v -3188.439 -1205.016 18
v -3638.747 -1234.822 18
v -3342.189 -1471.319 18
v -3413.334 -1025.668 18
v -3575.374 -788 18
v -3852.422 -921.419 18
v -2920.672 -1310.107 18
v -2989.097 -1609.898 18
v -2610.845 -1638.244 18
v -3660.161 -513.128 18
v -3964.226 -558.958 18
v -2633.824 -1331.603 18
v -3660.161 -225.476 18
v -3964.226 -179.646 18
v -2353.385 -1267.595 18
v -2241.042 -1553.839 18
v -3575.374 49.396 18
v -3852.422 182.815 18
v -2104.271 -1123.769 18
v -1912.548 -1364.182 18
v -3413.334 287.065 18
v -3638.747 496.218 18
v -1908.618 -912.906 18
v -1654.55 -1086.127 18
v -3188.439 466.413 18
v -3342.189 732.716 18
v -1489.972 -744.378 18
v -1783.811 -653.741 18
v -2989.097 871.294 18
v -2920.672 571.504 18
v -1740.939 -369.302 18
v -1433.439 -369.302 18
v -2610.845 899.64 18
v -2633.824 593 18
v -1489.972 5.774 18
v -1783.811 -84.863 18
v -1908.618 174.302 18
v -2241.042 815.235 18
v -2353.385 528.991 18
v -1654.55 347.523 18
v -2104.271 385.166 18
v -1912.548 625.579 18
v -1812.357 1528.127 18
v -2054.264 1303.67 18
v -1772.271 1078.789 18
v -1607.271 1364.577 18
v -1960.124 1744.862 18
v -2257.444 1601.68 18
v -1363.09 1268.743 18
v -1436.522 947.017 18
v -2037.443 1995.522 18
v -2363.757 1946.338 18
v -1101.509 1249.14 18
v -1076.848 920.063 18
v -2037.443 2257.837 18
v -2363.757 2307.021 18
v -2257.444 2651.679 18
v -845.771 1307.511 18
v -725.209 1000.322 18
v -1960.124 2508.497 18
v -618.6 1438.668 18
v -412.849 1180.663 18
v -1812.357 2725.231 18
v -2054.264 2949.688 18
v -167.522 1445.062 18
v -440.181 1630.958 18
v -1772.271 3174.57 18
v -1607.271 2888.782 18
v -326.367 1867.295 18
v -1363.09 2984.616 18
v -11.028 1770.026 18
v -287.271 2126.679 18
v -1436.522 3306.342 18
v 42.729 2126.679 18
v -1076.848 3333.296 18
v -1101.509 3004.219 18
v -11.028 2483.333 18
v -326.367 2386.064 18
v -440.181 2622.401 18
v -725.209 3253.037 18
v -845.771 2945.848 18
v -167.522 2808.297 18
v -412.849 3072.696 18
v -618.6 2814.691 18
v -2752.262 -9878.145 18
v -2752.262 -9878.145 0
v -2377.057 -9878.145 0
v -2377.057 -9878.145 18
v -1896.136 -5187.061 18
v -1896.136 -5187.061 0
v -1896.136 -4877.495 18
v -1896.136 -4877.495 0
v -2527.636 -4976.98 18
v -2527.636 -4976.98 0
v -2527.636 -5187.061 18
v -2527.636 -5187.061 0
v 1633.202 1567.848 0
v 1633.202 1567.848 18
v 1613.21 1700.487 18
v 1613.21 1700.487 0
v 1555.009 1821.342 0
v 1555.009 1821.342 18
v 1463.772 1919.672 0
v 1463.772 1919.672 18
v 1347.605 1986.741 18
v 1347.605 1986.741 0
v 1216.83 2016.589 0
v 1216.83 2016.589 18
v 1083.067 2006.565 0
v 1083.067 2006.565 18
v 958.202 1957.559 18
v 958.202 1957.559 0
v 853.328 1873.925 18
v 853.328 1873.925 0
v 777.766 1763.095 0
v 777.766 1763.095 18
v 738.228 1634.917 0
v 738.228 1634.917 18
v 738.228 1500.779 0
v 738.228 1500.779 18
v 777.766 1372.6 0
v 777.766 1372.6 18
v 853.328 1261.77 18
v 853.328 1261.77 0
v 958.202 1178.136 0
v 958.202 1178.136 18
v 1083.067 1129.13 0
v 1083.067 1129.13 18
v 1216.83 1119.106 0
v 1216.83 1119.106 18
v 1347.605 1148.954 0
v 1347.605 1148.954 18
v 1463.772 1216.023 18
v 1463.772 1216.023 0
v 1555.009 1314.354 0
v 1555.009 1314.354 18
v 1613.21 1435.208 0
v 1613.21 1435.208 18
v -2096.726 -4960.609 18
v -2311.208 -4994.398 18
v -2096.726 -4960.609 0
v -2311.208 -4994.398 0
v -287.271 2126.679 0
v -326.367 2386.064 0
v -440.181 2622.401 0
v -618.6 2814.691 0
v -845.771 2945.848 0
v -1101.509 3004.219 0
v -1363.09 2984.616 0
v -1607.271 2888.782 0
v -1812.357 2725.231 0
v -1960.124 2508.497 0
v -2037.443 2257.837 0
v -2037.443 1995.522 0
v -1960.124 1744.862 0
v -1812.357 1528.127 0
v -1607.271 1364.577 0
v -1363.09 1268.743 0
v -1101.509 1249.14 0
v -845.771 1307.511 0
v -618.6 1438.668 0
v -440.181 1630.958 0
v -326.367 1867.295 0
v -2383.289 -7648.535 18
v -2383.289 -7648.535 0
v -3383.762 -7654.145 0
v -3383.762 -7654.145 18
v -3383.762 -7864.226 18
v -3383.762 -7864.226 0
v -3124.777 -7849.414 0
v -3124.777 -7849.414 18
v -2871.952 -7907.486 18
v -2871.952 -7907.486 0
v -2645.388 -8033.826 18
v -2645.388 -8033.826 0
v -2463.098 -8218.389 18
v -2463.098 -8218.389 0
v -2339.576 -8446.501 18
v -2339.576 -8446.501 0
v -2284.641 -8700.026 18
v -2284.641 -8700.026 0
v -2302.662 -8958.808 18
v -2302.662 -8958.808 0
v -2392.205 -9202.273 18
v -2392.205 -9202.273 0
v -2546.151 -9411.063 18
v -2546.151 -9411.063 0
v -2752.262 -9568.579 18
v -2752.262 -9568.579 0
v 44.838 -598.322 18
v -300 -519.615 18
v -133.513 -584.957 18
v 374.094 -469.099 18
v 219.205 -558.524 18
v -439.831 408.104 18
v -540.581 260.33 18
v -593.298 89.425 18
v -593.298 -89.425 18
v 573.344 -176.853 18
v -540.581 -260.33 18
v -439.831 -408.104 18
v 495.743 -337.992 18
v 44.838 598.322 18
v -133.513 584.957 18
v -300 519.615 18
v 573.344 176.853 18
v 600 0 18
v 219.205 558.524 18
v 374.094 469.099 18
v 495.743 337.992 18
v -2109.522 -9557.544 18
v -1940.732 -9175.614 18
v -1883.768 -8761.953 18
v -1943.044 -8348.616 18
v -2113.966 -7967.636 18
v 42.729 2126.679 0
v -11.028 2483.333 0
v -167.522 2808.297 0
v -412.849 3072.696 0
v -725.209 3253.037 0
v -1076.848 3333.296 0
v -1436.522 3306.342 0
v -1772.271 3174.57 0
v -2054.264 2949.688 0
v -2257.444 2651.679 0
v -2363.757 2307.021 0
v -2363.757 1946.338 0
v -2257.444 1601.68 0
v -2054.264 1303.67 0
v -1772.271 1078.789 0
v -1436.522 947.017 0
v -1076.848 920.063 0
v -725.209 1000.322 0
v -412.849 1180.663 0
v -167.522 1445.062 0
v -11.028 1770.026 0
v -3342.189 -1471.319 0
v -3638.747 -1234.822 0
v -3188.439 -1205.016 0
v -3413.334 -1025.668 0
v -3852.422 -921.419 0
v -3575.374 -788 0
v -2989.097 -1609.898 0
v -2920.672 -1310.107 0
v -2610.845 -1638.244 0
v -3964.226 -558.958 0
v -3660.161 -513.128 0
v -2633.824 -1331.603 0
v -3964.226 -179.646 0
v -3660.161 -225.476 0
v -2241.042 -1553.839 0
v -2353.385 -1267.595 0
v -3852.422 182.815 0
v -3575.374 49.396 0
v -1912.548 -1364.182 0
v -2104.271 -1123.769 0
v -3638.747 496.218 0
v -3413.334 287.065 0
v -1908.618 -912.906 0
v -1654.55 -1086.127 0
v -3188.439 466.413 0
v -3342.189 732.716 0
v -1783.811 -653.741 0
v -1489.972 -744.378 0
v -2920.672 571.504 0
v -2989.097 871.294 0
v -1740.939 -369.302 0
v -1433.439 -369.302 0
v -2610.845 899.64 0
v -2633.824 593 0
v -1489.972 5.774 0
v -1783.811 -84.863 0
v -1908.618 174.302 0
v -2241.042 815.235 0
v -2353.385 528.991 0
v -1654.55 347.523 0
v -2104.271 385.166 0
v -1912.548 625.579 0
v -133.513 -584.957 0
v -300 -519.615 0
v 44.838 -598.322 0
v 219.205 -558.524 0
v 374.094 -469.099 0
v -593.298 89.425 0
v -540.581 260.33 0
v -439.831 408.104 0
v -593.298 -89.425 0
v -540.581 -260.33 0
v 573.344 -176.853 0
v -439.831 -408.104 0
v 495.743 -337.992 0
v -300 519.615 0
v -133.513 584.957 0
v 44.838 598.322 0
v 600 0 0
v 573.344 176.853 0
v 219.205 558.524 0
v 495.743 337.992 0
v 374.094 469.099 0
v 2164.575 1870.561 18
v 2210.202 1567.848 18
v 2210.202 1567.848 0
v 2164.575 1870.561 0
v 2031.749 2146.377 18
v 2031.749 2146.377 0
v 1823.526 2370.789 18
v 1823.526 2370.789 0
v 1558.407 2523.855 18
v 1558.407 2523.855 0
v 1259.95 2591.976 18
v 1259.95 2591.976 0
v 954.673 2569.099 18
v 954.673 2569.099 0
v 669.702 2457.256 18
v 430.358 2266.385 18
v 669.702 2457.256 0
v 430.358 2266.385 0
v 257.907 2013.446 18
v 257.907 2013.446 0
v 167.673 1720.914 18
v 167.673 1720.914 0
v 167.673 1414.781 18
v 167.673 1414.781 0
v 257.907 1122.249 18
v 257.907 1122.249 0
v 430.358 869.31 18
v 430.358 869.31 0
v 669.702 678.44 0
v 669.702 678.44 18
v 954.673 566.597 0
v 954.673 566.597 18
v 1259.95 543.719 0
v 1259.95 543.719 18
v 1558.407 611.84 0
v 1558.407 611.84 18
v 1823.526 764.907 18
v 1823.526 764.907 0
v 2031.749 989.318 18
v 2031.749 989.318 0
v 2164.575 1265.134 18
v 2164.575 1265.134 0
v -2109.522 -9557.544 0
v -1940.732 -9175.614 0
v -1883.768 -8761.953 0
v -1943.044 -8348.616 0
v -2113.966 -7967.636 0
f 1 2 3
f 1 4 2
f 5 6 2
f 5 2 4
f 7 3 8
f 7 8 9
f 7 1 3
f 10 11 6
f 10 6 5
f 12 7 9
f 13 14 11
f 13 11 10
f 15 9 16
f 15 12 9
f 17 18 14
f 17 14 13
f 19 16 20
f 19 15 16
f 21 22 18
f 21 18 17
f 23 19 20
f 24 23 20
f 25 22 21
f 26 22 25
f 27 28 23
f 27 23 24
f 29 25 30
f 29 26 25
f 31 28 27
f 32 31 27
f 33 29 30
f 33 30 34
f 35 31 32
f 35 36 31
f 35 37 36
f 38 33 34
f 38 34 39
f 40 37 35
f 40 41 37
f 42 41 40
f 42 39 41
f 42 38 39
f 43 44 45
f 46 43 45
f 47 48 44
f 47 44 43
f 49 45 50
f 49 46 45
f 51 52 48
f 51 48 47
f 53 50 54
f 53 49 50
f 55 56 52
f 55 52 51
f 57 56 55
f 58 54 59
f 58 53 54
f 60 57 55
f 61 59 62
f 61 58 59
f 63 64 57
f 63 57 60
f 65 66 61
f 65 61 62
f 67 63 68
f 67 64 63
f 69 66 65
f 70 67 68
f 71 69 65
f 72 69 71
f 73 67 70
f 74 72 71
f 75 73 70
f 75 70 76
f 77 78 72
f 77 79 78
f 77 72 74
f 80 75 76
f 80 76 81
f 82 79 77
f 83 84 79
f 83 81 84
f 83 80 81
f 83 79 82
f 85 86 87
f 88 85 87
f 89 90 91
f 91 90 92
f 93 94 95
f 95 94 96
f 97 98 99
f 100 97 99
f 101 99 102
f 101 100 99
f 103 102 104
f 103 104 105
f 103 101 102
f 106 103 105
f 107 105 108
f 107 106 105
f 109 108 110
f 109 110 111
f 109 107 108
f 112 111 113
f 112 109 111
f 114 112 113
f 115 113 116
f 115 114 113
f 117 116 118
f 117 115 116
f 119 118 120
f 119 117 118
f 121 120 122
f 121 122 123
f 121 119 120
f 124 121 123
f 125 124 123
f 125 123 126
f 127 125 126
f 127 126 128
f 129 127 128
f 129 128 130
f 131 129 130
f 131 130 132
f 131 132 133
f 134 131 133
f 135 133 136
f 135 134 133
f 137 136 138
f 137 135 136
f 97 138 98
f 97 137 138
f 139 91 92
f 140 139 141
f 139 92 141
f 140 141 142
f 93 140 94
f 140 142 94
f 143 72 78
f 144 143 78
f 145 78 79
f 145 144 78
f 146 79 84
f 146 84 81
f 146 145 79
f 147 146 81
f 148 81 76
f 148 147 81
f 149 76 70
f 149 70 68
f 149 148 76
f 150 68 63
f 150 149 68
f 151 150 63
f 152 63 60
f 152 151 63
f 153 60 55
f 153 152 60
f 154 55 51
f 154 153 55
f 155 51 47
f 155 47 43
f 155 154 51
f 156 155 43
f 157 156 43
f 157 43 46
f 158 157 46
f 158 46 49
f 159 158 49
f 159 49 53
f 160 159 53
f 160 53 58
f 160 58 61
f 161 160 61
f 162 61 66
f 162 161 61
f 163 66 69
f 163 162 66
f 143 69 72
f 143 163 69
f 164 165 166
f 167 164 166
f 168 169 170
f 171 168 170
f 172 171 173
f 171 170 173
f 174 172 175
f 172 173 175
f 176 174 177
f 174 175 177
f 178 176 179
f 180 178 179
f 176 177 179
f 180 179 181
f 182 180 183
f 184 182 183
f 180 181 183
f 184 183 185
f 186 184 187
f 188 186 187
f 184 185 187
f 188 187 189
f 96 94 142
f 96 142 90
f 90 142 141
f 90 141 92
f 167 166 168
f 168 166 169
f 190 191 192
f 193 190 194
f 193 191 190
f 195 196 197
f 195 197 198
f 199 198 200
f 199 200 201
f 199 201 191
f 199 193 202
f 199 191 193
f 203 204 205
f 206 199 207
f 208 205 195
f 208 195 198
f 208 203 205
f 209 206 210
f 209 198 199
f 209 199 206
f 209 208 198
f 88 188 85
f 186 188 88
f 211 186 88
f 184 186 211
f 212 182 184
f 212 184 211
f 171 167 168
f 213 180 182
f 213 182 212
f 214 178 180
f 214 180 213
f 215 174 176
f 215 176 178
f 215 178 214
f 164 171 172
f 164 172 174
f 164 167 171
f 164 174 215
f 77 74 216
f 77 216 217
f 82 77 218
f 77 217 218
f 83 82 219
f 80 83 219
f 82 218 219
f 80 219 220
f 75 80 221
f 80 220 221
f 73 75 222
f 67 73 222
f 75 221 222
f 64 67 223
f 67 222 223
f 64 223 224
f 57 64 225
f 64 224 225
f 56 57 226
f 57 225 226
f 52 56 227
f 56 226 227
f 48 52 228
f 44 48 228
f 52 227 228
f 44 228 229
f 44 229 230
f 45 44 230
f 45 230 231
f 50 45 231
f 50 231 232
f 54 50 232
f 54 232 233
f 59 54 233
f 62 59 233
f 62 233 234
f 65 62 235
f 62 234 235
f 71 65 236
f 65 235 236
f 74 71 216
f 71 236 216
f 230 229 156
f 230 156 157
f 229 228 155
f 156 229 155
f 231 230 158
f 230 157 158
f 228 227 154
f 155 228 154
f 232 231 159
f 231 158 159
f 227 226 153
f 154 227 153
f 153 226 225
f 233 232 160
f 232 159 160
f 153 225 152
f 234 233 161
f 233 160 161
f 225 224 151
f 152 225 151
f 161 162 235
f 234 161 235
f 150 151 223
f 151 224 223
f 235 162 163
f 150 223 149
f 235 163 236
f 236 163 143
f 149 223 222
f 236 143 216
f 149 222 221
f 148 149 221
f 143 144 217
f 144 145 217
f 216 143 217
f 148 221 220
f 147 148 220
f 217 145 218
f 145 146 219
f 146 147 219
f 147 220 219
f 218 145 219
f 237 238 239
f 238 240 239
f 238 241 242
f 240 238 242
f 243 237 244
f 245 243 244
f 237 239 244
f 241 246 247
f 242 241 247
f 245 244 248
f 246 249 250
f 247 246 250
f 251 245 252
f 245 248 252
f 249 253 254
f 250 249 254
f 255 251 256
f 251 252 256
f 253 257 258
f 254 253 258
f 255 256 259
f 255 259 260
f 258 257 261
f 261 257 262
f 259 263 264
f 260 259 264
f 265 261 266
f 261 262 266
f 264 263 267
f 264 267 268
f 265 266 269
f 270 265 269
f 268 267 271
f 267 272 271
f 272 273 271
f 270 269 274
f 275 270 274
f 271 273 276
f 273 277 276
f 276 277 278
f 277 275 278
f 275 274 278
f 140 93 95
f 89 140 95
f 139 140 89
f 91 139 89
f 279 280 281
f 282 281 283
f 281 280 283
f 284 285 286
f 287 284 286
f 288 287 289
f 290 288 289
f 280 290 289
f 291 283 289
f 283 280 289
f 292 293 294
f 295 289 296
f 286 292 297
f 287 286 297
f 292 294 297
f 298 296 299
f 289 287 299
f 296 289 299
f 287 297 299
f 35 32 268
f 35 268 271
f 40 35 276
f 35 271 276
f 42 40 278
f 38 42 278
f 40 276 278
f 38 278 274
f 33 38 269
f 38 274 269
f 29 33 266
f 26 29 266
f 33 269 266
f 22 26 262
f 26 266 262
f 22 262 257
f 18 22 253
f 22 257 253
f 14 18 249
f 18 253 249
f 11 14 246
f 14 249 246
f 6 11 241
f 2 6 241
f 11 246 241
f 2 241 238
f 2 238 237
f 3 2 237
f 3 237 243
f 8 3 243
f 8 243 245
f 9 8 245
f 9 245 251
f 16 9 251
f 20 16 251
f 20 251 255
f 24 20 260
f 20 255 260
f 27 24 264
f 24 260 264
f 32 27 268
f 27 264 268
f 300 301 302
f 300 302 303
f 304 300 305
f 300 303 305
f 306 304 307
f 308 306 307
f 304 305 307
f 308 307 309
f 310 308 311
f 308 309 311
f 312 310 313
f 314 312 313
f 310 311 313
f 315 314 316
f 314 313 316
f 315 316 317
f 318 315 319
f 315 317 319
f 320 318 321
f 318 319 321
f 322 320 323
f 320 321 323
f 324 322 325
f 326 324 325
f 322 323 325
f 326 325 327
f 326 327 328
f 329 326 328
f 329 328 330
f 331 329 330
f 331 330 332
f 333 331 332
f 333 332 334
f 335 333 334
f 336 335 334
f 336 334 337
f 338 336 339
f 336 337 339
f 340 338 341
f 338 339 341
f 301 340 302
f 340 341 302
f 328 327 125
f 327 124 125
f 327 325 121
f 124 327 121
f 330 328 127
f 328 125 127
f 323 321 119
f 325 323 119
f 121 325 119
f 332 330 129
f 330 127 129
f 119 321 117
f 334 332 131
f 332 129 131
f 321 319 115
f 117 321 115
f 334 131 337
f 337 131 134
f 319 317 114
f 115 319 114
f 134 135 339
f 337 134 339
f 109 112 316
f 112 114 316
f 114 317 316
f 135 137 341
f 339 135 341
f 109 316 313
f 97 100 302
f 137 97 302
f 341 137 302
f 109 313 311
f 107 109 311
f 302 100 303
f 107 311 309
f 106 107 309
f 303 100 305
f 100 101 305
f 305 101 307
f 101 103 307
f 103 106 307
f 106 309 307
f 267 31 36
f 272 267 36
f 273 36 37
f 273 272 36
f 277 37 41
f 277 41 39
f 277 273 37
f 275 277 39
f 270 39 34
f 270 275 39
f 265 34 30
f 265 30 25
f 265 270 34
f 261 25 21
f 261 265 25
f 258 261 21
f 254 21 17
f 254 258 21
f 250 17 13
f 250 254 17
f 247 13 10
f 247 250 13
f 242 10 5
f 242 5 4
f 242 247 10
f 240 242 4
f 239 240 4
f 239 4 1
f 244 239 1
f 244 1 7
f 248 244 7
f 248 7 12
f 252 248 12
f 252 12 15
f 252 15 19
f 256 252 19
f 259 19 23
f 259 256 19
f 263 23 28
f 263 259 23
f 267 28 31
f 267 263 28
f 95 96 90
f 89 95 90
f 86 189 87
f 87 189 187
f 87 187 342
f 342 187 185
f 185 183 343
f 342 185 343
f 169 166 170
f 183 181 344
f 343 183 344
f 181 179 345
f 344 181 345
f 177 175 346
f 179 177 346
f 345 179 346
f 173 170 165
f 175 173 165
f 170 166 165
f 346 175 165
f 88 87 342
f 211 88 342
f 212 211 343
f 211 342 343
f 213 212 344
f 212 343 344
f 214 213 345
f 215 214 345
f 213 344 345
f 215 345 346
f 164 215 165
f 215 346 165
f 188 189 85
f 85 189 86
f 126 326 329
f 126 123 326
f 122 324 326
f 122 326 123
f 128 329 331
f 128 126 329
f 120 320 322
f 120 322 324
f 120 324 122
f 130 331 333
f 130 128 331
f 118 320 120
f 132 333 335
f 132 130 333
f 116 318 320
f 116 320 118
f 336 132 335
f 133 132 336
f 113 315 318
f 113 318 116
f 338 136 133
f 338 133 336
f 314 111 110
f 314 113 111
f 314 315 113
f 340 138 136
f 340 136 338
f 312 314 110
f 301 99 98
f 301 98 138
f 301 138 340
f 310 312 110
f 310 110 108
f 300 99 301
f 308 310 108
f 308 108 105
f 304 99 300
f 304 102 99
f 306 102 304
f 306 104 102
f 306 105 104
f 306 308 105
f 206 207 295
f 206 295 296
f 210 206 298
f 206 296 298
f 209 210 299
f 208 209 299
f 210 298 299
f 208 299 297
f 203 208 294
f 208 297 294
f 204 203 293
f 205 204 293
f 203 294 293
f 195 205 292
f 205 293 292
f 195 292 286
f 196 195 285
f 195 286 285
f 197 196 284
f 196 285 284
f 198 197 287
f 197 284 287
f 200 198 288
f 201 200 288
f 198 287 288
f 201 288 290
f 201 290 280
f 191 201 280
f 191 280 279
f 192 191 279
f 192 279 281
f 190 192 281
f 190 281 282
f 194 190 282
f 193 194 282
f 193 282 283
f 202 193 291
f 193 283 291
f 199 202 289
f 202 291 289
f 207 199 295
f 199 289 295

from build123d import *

# Parameters (mm, degrees)
F0_R      = 600
F1_DEPTH  = 18
F2_R      = 1027
F2_R_2    = 450
F3_DEPTH  = 18
F4_R      = 1210
F4_R_2    = 880
F5_DEPTH  = 18
F6_R      = 1272.5
F6_R_2    = 965
F7_DEPTH  = 18
F9_DEPTH  = 18
F11_DEPTH = 18


with BuildPart() as f1:
    # F0 (on Top) → F1 (new body)
    with BuildSketch(Plane.XY):
        Circle(F0_R)
    extrude(amount=F1_DEPTH)


with BuildPart() as f3:
    # F2 (on Top) → F3 (new body)
    with BuildSketch(Plane.XY):
        with Locations((1183.201789856, 1567.84760952)):
            Circle(F2_R)
        with Locations((1183.201789856, 1567.84760952)):
            Circle(F2_R_2, mode=Mode.SUBTRACT)
    extrude(amount=F3_DEPTH)


with BuildPart() as f5:
    # F4 (on Top) → F5 (new body)
    with BuildSketch(Plane.XY):
        with Locations((-1167.2713756561, 2126.6794204712)):
            Circle(F4_R)
        with Locations((-1167.2713756561, 2126.6794204712)):
            Circle(F4_R_2, mode=Mode.SUBTRACT)
    extrude(amount=F5_DEPTH)


with BuildPart() as f7:
    # F6 (on Top) → F7 (new body)
    with BuildSketch(Plane.XY):
        with Locations((-2705.9388160706, -369.3017959595)):
            Circle(F6_R)
        with Locations((-2705.9388160706, -369.3017959595)):
            Circle(F6_R_2, mode=Mode.SUBTRACT)
    extrude(amount=F7_DEPTH)


with BuildPart() as f9:
    # F8 (on Top) → F9 (new body)
    with BuildSketch(Plane.XY):
        with BuildLine():
            ThreePointArc((-1896.1358144379, -4877.4950429265), (-2202.9667353597, -4983.8530885251), (-2527.6358144379, -4976.9801715458))
            Line((-2527.6358144379, -4976.9801715458), (-2527.6358144379, -5187.0612450341))
            Line((-2527.6358144379, -5187.0612450341), (-1896.1358144379, -5187.0612450341))
            Line((-1896.1358144379, -5187.0612450341), (-1896.1358144379, -4877.4950429265))
        make_face()
    extrude(amount=F9_DEPTH)


with BuildPart() as f11:
    # F10 (on face) → F11 (new body)
    with BuildSketch(Plane.XY):
        with BuildLine():
            ThreePointArc((-3383.762090595, -7864.2263730014), (-2339.5758122783, -8446.5011454854), (-2752.262090595, -9568.5790974055))
            Line((-2752.262090595, -9568.5790974055), (-2752.262090595, -9878.1452995131))
            Line((-2752.262090595, -9878.1452995131), (-2498.4145172777, -9878.1452995131))
            Line((-2498.4145172777, -9878.1452995131), (-2377.0565725809, -9878.1452995131))
            ThreePointArc((-2377.0565725809, -9878.1452995131), (-1883.7679503047, -8761.952556401), (-2383.2887193923, -7648.5348872878))
            Line((-2383.2887193923, -7648.5348872878), (-3383.762090595, -7654.1452995131))
            Line((-3383.762090595, -7654.1452995131), (-3383.762090595, -7864.2263730014))
        make_face()
    extrude(amount=F11_DEPTH)


solid = Compound([f1.part, f3.part, f5.part, f7.part, f9.part, f11.part])
